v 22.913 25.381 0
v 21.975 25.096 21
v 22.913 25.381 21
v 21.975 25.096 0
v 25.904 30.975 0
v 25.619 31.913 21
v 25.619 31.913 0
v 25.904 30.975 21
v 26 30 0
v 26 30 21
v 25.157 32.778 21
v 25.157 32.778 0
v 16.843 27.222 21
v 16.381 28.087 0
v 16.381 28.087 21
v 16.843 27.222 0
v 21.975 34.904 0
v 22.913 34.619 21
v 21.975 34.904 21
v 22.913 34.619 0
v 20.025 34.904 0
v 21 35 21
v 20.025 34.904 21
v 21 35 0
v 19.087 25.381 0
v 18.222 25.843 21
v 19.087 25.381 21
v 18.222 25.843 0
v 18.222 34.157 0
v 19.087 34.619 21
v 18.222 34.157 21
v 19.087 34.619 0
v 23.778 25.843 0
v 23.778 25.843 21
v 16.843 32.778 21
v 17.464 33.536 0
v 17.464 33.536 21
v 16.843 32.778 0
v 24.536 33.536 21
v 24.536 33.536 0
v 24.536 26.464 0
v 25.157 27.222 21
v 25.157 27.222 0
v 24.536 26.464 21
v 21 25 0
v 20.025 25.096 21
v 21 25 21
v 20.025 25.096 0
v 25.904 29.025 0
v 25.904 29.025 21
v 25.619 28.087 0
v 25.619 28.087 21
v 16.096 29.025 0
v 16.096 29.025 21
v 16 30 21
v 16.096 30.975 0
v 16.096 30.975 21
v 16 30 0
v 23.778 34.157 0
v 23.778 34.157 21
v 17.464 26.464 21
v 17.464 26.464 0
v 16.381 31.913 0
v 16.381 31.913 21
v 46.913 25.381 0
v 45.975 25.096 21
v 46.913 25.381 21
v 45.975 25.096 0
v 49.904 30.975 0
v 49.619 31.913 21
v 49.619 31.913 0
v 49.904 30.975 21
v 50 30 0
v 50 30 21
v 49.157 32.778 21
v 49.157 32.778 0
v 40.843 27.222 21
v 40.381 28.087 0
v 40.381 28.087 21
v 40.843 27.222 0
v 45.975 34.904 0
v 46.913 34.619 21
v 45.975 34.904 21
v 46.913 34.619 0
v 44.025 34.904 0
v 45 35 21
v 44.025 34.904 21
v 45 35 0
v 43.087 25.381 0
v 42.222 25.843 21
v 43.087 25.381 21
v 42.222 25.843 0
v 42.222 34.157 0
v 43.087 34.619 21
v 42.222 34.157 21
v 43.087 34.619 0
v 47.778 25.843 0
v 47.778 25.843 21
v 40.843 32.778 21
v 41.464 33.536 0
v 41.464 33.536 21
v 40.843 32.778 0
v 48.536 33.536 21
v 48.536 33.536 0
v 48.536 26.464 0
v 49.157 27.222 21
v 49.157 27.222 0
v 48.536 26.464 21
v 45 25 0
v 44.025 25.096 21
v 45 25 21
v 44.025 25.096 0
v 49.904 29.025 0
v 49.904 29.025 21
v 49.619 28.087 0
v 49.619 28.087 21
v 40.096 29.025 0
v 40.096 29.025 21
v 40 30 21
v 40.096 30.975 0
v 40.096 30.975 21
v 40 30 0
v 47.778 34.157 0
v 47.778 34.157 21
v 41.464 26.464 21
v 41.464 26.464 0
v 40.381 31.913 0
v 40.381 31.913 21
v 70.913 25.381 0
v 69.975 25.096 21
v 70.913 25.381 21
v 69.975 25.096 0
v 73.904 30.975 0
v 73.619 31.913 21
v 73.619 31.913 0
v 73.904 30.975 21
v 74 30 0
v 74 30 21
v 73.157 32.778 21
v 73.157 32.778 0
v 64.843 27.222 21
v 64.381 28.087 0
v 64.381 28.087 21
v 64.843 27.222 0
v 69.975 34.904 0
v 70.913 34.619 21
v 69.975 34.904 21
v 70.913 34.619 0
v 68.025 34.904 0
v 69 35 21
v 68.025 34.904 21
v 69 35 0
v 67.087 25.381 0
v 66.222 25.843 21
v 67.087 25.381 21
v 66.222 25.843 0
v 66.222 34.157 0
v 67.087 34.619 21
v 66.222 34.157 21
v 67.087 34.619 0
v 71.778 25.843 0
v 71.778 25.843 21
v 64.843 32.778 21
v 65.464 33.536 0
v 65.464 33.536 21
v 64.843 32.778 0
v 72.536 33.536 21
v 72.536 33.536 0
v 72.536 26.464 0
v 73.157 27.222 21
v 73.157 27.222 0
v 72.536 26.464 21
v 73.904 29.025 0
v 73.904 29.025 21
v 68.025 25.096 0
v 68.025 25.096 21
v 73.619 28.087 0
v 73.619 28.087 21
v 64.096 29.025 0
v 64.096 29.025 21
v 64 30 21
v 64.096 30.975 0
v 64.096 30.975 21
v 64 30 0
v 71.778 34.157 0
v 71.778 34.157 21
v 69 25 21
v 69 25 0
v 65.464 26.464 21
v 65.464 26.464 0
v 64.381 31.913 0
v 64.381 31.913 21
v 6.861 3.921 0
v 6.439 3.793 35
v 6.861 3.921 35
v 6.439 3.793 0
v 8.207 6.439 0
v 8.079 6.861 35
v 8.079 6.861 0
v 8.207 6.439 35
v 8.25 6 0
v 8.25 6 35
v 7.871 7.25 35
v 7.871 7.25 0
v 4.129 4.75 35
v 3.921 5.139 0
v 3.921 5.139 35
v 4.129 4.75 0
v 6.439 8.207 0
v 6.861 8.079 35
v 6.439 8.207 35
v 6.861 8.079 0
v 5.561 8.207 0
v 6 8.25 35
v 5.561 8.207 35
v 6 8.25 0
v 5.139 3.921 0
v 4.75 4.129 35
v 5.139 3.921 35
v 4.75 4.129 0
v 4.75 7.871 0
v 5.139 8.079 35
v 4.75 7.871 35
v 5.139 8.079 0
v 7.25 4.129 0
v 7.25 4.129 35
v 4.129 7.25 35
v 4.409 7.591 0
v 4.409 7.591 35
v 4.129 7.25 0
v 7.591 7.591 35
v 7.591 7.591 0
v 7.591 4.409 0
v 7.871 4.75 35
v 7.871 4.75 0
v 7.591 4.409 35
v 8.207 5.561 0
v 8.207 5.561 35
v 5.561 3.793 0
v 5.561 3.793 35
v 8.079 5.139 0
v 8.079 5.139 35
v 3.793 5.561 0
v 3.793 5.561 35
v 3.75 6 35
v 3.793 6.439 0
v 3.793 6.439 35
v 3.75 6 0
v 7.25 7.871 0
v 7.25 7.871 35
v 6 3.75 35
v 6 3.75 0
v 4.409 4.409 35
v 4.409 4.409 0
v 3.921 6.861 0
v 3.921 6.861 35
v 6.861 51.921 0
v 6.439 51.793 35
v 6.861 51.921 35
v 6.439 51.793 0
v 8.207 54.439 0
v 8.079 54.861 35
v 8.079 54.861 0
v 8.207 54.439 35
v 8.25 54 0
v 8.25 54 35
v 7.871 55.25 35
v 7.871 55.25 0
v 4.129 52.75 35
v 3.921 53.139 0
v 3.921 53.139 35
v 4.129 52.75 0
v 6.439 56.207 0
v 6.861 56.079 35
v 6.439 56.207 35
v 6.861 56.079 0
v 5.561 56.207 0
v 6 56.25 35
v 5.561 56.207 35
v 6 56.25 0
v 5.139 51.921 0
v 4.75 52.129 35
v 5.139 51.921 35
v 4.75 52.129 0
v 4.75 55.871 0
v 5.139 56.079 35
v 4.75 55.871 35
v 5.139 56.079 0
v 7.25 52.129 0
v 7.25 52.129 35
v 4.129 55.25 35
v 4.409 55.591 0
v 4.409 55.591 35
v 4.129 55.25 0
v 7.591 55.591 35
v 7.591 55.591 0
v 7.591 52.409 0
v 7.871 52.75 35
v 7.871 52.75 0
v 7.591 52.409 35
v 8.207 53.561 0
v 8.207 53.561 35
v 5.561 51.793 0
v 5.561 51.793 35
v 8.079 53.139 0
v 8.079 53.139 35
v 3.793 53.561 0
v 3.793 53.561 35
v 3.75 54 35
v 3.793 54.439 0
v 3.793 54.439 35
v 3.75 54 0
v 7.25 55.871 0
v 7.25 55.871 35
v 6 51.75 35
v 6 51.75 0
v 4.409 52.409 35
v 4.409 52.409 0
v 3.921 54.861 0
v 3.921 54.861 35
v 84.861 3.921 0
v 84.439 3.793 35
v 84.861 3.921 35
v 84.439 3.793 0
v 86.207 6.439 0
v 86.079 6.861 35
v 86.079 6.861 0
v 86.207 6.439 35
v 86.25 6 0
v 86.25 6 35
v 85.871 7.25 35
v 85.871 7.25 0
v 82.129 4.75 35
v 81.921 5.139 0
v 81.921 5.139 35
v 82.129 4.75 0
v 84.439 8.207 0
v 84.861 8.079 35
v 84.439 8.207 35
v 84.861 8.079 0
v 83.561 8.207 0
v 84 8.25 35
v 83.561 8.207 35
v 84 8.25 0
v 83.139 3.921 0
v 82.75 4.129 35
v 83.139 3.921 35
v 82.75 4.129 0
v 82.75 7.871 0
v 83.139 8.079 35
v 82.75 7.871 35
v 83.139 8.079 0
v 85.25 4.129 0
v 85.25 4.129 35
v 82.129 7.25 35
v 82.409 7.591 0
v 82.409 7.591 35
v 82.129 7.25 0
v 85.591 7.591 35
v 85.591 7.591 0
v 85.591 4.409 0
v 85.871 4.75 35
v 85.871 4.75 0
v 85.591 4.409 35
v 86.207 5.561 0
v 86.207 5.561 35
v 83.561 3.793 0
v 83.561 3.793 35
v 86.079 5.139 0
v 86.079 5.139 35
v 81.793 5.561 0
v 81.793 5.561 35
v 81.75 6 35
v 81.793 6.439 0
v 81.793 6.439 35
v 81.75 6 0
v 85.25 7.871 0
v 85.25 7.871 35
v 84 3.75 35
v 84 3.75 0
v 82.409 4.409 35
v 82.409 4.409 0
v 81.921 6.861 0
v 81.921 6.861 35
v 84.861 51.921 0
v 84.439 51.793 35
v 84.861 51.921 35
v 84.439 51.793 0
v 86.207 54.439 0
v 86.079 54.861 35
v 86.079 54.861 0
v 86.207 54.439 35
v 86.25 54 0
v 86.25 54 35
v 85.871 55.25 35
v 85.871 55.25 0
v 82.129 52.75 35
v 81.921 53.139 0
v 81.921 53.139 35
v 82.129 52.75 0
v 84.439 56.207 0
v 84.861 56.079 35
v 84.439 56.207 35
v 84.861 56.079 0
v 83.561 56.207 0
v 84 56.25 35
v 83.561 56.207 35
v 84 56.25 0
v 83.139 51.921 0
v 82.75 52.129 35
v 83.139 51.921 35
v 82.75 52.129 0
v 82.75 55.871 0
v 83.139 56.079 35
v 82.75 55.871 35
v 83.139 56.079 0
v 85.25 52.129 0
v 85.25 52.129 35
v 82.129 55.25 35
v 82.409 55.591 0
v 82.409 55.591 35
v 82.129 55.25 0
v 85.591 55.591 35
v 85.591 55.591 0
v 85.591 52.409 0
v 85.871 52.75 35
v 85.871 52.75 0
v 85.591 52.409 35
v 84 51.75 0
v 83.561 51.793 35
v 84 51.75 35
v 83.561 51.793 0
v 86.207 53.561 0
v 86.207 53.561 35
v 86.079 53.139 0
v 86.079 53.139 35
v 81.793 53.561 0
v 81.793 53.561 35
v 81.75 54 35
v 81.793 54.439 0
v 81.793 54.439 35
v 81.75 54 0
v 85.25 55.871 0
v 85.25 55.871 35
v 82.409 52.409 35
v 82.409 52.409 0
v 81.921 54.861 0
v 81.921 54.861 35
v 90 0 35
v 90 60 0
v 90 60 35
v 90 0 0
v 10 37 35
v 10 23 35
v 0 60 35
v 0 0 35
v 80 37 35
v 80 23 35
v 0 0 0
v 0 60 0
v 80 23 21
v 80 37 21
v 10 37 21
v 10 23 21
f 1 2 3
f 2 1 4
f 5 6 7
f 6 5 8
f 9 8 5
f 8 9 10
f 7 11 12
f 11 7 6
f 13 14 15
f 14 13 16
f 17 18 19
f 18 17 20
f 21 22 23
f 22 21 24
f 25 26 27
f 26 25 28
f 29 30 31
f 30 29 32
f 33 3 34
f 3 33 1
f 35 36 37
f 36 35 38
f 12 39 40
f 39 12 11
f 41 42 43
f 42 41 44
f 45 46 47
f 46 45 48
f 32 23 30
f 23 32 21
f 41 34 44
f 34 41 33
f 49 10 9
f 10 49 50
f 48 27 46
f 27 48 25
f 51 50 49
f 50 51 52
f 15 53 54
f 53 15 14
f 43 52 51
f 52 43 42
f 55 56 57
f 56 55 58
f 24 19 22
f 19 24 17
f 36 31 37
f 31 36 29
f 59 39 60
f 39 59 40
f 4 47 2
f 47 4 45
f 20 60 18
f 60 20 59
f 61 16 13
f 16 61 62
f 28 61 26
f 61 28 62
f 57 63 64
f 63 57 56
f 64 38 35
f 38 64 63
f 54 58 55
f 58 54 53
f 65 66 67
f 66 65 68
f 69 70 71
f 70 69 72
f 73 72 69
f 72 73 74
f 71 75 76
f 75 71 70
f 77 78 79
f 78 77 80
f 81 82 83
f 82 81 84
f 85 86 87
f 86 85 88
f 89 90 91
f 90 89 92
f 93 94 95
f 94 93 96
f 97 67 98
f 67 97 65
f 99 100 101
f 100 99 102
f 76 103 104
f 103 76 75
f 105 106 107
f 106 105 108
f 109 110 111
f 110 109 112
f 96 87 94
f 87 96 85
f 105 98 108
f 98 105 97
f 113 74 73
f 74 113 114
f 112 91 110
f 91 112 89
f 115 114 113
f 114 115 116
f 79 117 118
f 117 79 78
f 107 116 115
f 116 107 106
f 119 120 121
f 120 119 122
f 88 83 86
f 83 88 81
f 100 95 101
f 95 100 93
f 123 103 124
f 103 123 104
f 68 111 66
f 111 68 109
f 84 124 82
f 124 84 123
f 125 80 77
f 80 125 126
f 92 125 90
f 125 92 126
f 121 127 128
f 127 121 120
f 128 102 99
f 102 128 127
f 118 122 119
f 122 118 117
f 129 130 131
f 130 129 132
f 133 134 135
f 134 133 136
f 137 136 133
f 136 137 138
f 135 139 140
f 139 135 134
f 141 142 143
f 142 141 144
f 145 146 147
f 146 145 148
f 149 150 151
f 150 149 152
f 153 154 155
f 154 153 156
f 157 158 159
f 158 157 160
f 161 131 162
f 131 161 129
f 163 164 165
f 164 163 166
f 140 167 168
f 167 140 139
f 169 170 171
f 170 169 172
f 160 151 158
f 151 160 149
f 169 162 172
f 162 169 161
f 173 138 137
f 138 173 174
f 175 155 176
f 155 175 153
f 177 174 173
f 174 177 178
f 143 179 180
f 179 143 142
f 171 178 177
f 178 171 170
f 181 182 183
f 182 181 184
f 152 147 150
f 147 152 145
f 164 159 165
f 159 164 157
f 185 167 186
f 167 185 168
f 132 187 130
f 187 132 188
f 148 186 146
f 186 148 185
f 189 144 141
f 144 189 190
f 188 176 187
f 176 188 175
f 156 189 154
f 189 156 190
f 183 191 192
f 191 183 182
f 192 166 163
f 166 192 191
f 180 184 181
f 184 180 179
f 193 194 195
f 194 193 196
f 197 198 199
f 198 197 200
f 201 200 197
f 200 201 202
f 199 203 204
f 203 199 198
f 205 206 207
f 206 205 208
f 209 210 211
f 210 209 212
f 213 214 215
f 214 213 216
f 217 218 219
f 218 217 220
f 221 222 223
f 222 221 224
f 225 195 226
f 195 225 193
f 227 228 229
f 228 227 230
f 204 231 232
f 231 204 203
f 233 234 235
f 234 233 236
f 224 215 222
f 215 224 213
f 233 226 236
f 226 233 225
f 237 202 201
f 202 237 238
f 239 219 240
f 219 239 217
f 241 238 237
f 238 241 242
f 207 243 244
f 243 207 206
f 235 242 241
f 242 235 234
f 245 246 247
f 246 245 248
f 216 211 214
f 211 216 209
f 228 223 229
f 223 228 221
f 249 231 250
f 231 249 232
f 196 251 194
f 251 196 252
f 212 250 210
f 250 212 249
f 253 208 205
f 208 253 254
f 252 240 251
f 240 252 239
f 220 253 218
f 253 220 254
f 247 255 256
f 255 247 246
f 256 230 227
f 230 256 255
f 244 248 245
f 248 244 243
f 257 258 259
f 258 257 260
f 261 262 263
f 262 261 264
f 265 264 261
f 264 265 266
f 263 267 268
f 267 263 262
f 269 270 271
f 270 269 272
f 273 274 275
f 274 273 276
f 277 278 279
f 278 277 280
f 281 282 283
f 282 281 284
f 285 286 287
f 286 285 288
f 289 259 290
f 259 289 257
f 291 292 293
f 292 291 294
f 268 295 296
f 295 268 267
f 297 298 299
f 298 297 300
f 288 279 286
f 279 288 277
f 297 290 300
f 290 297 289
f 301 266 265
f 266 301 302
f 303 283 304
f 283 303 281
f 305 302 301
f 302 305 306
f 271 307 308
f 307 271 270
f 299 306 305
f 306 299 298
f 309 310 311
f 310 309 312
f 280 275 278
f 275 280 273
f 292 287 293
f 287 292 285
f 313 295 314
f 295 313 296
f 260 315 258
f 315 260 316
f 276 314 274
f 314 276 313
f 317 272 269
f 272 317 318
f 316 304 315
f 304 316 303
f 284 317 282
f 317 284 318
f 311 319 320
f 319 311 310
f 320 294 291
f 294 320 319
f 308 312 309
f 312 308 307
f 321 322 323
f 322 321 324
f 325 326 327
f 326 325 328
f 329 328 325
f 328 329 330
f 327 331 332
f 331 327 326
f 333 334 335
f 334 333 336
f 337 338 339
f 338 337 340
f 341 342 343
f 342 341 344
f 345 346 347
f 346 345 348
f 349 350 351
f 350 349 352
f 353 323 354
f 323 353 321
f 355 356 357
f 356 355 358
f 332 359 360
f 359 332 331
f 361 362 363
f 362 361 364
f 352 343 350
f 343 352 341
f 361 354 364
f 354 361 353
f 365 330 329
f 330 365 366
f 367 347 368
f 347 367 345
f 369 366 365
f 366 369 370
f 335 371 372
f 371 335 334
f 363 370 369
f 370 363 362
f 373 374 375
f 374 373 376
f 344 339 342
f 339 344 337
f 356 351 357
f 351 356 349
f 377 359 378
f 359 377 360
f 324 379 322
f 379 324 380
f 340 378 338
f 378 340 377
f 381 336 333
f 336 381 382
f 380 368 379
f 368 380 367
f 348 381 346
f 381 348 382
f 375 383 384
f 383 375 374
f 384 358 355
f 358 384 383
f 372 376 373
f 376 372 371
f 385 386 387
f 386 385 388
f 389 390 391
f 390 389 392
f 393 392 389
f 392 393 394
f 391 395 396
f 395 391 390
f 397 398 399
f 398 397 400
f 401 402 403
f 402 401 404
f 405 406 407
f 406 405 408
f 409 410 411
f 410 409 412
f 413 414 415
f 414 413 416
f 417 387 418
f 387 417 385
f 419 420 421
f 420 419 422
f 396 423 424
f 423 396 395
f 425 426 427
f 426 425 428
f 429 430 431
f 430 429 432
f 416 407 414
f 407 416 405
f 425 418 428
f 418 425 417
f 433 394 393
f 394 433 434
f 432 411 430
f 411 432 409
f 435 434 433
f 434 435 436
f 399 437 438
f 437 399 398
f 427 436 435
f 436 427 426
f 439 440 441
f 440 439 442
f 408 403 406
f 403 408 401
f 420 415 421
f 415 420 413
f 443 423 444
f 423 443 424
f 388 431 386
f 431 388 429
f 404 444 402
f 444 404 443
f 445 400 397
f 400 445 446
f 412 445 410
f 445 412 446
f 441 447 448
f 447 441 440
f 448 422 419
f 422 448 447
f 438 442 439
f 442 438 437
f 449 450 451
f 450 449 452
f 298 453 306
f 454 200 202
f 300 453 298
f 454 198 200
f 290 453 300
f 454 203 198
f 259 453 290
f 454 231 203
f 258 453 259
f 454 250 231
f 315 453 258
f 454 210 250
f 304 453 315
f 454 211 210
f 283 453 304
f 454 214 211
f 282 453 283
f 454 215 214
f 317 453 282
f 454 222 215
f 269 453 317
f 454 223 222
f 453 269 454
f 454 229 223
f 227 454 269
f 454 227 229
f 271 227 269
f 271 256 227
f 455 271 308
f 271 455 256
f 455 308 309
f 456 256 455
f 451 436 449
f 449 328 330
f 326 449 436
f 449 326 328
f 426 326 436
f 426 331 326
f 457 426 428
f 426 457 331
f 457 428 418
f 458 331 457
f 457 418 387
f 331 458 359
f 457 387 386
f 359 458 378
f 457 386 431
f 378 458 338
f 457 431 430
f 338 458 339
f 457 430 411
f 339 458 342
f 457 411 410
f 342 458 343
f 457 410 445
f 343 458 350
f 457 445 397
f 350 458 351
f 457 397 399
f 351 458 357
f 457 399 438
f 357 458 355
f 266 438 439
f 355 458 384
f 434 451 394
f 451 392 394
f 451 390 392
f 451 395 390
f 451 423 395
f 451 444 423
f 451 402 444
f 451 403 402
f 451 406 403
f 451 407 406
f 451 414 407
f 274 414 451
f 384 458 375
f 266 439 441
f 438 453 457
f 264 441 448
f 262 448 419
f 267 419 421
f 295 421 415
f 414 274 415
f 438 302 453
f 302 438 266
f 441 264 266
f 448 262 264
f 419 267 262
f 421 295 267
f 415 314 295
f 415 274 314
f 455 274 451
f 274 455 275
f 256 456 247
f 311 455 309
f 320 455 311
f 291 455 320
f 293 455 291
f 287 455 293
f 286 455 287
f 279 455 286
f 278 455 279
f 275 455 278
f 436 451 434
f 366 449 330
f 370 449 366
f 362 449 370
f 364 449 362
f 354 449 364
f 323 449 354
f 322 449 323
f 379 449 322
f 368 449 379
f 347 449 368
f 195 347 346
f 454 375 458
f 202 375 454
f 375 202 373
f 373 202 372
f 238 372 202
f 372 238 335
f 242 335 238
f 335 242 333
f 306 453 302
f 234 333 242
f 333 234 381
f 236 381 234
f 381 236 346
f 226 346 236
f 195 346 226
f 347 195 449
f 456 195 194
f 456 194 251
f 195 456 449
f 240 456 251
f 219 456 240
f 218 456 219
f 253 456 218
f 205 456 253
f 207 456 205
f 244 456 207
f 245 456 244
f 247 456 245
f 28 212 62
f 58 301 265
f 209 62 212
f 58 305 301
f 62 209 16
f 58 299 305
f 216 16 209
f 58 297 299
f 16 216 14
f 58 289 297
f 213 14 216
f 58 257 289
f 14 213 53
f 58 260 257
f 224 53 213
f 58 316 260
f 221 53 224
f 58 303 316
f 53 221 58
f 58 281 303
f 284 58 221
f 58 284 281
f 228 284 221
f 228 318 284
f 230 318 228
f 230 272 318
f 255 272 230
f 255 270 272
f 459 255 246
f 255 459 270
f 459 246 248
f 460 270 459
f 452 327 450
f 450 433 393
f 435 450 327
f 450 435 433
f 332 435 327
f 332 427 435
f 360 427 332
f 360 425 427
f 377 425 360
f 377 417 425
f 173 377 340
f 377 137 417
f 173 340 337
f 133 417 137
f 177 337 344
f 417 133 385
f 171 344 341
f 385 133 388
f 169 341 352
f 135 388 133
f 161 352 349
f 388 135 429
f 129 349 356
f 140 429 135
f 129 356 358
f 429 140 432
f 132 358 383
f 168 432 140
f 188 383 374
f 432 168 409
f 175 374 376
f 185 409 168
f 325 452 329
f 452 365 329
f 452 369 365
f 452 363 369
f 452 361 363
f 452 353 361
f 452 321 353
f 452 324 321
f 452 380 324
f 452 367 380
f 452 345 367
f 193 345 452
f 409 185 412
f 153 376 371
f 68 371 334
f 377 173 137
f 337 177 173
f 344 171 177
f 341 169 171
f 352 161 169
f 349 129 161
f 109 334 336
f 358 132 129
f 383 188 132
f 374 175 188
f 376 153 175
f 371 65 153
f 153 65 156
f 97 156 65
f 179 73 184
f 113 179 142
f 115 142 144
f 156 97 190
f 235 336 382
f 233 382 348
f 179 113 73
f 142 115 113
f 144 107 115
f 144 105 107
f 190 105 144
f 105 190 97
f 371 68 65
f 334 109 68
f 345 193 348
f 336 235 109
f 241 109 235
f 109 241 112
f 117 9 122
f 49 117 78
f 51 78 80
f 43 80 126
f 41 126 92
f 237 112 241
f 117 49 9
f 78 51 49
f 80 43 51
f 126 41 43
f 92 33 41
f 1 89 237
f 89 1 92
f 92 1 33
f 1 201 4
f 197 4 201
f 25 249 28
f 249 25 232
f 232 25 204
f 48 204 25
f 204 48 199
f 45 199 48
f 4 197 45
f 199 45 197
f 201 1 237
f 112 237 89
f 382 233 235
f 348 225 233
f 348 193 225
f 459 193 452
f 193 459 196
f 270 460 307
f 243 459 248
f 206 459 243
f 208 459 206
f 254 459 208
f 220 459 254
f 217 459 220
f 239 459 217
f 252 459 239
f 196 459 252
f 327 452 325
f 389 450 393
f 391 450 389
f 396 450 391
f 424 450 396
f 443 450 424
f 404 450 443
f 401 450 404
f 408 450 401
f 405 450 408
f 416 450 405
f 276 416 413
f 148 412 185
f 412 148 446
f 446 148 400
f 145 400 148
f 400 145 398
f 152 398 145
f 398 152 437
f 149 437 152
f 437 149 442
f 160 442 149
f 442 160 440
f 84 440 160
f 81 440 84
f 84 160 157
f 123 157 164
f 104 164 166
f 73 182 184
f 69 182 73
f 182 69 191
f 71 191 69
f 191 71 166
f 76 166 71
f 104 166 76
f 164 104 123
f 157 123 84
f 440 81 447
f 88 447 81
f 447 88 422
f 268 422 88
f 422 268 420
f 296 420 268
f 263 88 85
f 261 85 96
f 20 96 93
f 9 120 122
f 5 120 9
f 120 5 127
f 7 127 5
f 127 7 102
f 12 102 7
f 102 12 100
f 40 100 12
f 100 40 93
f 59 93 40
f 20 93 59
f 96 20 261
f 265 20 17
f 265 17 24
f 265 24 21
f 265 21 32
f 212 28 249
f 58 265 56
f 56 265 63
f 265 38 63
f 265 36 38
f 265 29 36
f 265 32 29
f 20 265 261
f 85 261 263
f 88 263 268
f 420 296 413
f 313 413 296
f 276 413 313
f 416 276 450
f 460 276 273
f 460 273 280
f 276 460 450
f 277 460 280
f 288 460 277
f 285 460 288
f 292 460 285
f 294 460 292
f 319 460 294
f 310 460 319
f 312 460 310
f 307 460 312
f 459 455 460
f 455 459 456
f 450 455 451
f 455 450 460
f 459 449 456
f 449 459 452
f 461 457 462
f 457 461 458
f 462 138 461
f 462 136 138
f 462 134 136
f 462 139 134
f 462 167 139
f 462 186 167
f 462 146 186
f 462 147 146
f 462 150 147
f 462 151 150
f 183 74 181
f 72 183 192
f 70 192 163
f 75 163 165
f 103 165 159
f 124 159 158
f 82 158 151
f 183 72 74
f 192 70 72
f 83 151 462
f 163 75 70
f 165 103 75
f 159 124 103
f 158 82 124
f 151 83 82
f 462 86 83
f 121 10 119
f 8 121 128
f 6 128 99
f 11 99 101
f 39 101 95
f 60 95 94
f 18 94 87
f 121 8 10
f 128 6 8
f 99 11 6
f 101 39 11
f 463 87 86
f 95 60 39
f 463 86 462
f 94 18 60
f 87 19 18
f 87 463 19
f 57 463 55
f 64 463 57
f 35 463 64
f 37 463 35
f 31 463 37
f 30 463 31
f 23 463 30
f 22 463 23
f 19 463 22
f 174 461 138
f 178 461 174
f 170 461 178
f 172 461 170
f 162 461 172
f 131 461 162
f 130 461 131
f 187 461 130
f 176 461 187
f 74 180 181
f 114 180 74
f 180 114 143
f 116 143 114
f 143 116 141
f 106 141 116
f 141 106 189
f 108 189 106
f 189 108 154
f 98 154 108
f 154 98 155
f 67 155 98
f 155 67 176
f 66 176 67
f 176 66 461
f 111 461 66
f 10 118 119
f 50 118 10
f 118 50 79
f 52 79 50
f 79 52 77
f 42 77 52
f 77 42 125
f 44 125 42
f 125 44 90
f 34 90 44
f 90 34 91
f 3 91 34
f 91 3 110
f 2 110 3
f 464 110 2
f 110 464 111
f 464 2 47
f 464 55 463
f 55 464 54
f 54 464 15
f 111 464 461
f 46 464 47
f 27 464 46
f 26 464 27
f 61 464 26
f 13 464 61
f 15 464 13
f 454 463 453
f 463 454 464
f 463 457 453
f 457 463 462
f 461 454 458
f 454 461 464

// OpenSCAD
$fn = 32;

// ----------------------------------------------------------------------
// Manifold block: gallery_top manifold
// ----------------------------------------------------------------------

// --- parameters (mm) ---
block_l = 90;             // block length, X
block_w = 60;             // block width, Y
block_h = 35;             // block height, Z
port_d = 10;              // port bore diameter
port_pitch = 24;          // port pitch along X
gallery_d = 14;           // top gallery width, Y
gallery_depth = 14;       // gallery pocket depth
wall_p = 10;              // gallery end wall thickness, X
mnt_d = 4.5;              // mounting hole diameter
mnt_in = 6;               // mounting hole inset from the edges

n_ports = 3;  // ports in the row
port_x0 = (block_l - (n_ports - 1) * port_pitch) / 2;  // first port X

difference() {
  cube([block_l, block_w, block_h]);
  for (i = [0 : n_ports - 1])
    translate([port_x0 + i * port_pitch, block_w / 2, -1])
      cylinder(h = block_h + 2, d = port_d);
  translate([wall_p, block_w / 2 - gallery_d / 2, block_h - gallery_depth])
    cube([block_l - 2 * wall_p, gallery_d, gallery_depth + 1]);
  for (cx = [mnt_in, block_l - mnt_in])
    for (cy = [mnt_in, block_w - mnt_in])
      translate([cx, cy, -1]) cylinder(h = block_h + 2, d = mnt_d);
}
